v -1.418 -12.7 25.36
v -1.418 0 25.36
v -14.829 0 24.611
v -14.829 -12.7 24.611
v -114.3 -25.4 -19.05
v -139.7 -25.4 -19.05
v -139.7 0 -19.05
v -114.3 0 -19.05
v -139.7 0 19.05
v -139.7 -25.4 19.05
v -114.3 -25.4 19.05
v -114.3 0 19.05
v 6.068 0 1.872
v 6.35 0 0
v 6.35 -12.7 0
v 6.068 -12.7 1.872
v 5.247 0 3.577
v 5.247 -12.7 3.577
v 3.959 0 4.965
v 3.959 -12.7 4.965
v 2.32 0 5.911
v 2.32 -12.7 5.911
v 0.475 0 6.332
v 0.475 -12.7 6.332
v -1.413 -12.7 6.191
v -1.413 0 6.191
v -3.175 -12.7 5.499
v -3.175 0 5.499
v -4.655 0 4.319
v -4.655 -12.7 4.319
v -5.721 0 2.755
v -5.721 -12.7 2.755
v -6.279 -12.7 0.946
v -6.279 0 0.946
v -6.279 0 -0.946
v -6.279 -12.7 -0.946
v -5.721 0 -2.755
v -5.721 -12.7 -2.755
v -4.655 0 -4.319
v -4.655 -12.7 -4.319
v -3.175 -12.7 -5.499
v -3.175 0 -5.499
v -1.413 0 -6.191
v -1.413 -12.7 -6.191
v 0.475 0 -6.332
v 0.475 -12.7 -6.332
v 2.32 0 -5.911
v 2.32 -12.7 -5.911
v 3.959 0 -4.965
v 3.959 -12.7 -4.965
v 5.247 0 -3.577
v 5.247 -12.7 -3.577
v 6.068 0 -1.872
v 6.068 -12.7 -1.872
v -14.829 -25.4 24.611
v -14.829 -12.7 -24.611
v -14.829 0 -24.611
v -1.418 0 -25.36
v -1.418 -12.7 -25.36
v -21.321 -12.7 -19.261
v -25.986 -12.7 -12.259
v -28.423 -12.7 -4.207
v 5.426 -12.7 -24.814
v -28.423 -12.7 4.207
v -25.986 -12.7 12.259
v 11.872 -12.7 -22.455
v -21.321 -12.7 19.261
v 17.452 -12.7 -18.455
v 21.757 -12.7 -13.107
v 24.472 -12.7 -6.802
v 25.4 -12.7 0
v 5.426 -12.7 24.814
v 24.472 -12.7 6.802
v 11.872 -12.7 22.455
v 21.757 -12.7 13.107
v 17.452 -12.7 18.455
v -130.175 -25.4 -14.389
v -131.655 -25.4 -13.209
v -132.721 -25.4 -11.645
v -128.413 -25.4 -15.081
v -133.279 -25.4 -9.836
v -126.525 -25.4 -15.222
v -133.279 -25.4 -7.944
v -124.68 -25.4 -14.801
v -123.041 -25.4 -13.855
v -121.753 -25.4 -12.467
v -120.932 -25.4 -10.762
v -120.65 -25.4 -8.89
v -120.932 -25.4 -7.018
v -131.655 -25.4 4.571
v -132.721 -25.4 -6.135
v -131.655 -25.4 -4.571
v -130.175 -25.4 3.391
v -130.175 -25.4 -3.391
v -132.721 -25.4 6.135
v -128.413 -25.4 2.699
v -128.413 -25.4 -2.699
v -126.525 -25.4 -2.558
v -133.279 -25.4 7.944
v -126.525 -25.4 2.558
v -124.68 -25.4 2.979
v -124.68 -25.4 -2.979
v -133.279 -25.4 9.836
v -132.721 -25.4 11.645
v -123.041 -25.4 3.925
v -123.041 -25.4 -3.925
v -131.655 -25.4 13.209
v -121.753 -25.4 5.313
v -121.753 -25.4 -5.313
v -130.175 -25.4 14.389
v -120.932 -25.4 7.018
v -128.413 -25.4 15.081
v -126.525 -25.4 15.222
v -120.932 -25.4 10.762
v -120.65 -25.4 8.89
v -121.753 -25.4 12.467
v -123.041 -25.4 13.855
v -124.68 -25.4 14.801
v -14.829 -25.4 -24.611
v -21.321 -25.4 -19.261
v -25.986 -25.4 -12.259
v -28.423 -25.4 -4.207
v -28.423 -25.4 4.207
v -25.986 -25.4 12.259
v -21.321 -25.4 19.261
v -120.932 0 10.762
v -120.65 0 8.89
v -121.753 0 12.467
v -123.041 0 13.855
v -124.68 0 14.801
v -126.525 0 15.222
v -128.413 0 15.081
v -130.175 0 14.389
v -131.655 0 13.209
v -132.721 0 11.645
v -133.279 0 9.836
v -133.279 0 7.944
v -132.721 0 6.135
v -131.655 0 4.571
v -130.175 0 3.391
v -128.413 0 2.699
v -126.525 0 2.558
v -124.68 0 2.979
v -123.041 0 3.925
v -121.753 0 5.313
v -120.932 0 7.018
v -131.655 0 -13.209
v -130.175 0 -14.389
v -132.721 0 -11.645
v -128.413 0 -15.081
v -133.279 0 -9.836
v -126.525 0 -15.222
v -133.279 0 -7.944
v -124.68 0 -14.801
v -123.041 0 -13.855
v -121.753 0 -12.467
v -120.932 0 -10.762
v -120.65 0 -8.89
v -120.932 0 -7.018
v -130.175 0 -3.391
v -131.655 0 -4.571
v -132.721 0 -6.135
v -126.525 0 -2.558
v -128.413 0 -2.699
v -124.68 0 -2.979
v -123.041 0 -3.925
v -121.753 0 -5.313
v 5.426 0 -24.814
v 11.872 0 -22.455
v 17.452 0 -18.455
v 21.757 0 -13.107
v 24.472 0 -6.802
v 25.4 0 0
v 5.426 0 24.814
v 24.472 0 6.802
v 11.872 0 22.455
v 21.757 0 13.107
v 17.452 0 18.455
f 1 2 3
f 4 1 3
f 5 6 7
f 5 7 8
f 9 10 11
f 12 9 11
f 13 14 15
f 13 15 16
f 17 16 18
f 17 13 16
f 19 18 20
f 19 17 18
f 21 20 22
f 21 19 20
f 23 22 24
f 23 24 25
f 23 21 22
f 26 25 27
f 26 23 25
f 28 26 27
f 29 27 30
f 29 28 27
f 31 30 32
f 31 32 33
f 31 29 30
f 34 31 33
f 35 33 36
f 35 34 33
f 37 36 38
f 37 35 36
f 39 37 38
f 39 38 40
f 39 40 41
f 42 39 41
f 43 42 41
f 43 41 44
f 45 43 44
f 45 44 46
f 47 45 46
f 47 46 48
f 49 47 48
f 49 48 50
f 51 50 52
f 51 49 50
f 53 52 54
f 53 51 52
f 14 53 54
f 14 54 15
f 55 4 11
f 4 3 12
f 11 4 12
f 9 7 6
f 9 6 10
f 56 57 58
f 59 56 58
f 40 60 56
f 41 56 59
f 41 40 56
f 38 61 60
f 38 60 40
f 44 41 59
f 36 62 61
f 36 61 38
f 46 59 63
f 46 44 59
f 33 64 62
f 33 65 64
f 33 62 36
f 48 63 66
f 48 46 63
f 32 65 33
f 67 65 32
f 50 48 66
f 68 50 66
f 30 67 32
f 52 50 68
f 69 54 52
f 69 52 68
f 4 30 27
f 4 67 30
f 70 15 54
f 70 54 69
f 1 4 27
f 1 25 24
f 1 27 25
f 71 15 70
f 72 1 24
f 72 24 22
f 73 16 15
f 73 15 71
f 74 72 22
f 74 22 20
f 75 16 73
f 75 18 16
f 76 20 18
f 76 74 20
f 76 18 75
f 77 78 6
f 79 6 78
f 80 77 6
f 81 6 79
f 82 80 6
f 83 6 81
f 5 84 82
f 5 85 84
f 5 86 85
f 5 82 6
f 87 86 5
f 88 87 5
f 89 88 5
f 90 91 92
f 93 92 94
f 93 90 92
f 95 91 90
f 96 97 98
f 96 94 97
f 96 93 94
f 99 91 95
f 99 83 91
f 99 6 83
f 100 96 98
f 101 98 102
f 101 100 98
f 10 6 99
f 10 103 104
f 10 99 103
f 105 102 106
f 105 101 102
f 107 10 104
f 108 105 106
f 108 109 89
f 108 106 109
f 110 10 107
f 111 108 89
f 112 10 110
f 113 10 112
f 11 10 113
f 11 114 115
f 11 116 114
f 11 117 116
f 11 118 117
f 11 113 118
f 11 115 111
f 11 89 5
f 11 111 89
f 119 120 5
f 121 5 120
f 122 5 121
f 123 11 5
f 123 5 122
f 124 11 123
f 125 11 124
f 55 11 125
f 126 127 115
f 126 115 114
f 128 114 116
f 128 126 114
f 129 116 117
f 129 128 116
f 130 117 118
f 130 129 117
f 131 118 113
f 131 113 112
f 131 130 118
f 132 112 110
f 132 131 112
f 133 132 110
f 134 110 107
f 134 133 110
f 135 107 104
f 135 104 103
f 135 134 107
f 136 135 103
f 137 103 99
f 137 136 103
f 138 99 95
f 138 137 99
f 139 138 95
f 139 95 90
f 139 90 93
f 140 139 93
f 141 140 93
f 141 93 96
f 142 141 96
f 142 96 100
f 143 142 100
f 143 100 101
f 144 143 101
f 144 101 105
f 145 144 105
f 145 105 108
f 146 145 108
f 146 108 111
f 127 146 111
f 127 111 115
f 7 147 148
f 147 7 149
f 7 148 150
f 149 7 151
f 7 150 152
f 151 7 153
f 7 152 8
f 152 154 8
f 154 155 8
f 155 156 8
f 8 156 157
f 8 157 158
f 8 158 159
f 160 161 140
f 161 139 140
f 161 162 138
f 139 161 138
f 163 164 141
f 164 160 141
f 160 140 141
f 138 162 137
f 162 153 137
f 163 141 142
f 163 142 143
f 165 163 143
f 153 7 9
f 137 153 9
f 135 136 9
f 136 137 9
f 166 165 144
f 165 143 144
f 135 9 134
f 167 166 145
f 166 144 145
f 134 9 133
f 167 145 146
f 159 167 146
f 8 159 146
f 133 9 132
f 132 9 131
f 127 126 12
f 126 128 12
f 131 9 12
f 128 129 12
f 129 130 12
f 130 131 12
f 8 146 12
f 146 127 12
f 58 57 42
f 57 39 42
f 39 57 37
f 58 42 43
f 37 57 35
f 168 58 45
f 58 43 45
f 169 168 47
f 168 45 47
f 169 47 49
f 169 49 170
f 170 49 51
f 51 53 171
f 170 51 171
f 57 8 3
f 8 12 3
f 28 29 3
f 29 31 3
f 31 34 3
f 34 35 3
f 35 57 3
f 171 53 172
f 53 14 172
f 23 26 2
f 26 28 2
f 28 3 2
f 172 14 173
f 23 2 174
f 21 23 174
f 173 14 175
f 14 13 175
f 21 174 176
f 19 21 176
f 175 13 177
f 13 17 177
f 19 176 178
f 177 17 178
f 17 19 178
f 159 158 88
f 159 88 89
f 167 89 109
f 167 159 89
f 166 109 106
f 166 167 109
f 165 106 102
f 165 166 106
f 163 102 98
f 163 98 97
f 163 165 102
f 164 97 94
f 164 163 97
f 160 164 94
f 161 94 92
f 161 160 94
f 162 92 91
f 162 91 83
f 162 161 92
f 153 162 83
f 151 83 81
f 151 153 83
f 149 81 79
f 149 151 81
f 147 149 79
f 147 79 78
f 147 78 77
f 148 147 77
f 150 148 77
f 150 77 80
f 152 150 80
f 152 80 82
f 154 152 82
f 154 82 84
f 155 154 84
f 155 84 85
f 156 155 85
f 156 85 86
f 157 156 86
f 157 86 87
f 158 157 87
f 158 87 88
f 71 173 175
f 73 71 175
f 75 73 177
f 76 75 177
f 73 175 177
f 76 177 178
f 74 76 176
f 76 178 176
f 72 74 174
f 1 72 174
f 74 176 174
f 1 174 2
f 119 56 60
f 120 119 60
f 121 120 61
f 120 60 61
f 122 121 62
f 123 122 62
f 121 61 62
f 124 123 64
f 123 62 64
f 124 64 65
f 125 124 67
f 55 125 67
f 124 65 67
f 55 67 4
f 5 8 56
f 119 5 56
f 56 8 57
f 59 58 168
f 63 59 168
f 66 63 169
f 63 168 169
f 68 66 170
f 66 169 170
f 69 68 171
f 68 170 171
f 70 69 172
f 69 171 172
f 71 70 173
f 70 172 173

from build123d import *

# Parameters (mm, degrees)
F0_R     = 6.35
F0_W     = 25.4
F0_H     = 38.1
F1_DEPTH = 12.7
F2_DEPTH = 25.4


with BuildPart() as f1:
    # F0 (on Front) → F1 (new body)
    with BuildSketch(Plane.XZ):
        with BuildLine():
            ThreePointArc((-1.41771, -25.360404), (17.452079, -18.454943), (25.4, 0))
            ThreePointArc((25.4, 0), (17.452079, 18.454943), (-1.41771, 25.360404))
            ThreePointArc((-1.41771, 25.360404), (-25.4, 0), (-1.41771, -25.360404))
        make_face()
        Circle(F0_R, mode=Mode.SUBTRACT)
        with BuildLine():
            ThreePointArc((-1.41771, -25.360404), (-25.4, 0), (-1.41771, 25.360404))
            Line((-1.41771, 25.360404), (-14.828552, 24.610704))
            ThreePointArc((-14.828552, 24.610704), (-28.732781, 0), (-14.828552, -24.610704))
            Line((-14.828552, -24.610704), (-1.41771, -25.360404))
        make_face()
        with BuildLine():
            ThreePointArc((-14.828552, -24.610704), (-28.732781, 0), (-14.828552, 24.610704))
            Line((-14.828552, 24.610704), (-114.3, 19.05))
            Line((-114.3, 19.05), (-114.3, -19.05))
            Line((-114.3, -19.05), (-14.828552, -24.610704))
        make_face()
        with Locations((-127, 0)):
            Rectangle(F0_W, F0_H)
        with Locations((-127, -8.89)):
            Circle(F0_R, mode=Mode.SUBTRACT)
        with Locations((-127, 8.89)):
            Circle(F0_R, mode=Mode.SUBTRACT)
    extrude(amount=F1_DEPTH)

    # F0 (on Front) → F2 (join)
    with BuildSketch(Plane.XZ):
        with BuildLine():
            ThreePointArc((-14.828552, -24.610704), (-28.732781, 0), (-14.828552, 24.610704))
            Line((-14.828552, 24.610704), (-114.3, 19.05))
            Line((-114.3, 19.05), (-114.3, -19.05))
            Line((-114.3, -19.05), (-14.828552, -24.610704))
        make_face()
        with Locations((-127, 0)):
            Rectangle(F0_W, F0_H)
        with Locations((-127, -8.89)):
            Circle(F0_R, mode=Mode.SUBTRACT)
        with Locations((-127, 8.89)):
            Circle(F0_R, mode=Mode.SUBTRACT)
    extrude(amount=F2_DEPTH)


solid = f1.part
